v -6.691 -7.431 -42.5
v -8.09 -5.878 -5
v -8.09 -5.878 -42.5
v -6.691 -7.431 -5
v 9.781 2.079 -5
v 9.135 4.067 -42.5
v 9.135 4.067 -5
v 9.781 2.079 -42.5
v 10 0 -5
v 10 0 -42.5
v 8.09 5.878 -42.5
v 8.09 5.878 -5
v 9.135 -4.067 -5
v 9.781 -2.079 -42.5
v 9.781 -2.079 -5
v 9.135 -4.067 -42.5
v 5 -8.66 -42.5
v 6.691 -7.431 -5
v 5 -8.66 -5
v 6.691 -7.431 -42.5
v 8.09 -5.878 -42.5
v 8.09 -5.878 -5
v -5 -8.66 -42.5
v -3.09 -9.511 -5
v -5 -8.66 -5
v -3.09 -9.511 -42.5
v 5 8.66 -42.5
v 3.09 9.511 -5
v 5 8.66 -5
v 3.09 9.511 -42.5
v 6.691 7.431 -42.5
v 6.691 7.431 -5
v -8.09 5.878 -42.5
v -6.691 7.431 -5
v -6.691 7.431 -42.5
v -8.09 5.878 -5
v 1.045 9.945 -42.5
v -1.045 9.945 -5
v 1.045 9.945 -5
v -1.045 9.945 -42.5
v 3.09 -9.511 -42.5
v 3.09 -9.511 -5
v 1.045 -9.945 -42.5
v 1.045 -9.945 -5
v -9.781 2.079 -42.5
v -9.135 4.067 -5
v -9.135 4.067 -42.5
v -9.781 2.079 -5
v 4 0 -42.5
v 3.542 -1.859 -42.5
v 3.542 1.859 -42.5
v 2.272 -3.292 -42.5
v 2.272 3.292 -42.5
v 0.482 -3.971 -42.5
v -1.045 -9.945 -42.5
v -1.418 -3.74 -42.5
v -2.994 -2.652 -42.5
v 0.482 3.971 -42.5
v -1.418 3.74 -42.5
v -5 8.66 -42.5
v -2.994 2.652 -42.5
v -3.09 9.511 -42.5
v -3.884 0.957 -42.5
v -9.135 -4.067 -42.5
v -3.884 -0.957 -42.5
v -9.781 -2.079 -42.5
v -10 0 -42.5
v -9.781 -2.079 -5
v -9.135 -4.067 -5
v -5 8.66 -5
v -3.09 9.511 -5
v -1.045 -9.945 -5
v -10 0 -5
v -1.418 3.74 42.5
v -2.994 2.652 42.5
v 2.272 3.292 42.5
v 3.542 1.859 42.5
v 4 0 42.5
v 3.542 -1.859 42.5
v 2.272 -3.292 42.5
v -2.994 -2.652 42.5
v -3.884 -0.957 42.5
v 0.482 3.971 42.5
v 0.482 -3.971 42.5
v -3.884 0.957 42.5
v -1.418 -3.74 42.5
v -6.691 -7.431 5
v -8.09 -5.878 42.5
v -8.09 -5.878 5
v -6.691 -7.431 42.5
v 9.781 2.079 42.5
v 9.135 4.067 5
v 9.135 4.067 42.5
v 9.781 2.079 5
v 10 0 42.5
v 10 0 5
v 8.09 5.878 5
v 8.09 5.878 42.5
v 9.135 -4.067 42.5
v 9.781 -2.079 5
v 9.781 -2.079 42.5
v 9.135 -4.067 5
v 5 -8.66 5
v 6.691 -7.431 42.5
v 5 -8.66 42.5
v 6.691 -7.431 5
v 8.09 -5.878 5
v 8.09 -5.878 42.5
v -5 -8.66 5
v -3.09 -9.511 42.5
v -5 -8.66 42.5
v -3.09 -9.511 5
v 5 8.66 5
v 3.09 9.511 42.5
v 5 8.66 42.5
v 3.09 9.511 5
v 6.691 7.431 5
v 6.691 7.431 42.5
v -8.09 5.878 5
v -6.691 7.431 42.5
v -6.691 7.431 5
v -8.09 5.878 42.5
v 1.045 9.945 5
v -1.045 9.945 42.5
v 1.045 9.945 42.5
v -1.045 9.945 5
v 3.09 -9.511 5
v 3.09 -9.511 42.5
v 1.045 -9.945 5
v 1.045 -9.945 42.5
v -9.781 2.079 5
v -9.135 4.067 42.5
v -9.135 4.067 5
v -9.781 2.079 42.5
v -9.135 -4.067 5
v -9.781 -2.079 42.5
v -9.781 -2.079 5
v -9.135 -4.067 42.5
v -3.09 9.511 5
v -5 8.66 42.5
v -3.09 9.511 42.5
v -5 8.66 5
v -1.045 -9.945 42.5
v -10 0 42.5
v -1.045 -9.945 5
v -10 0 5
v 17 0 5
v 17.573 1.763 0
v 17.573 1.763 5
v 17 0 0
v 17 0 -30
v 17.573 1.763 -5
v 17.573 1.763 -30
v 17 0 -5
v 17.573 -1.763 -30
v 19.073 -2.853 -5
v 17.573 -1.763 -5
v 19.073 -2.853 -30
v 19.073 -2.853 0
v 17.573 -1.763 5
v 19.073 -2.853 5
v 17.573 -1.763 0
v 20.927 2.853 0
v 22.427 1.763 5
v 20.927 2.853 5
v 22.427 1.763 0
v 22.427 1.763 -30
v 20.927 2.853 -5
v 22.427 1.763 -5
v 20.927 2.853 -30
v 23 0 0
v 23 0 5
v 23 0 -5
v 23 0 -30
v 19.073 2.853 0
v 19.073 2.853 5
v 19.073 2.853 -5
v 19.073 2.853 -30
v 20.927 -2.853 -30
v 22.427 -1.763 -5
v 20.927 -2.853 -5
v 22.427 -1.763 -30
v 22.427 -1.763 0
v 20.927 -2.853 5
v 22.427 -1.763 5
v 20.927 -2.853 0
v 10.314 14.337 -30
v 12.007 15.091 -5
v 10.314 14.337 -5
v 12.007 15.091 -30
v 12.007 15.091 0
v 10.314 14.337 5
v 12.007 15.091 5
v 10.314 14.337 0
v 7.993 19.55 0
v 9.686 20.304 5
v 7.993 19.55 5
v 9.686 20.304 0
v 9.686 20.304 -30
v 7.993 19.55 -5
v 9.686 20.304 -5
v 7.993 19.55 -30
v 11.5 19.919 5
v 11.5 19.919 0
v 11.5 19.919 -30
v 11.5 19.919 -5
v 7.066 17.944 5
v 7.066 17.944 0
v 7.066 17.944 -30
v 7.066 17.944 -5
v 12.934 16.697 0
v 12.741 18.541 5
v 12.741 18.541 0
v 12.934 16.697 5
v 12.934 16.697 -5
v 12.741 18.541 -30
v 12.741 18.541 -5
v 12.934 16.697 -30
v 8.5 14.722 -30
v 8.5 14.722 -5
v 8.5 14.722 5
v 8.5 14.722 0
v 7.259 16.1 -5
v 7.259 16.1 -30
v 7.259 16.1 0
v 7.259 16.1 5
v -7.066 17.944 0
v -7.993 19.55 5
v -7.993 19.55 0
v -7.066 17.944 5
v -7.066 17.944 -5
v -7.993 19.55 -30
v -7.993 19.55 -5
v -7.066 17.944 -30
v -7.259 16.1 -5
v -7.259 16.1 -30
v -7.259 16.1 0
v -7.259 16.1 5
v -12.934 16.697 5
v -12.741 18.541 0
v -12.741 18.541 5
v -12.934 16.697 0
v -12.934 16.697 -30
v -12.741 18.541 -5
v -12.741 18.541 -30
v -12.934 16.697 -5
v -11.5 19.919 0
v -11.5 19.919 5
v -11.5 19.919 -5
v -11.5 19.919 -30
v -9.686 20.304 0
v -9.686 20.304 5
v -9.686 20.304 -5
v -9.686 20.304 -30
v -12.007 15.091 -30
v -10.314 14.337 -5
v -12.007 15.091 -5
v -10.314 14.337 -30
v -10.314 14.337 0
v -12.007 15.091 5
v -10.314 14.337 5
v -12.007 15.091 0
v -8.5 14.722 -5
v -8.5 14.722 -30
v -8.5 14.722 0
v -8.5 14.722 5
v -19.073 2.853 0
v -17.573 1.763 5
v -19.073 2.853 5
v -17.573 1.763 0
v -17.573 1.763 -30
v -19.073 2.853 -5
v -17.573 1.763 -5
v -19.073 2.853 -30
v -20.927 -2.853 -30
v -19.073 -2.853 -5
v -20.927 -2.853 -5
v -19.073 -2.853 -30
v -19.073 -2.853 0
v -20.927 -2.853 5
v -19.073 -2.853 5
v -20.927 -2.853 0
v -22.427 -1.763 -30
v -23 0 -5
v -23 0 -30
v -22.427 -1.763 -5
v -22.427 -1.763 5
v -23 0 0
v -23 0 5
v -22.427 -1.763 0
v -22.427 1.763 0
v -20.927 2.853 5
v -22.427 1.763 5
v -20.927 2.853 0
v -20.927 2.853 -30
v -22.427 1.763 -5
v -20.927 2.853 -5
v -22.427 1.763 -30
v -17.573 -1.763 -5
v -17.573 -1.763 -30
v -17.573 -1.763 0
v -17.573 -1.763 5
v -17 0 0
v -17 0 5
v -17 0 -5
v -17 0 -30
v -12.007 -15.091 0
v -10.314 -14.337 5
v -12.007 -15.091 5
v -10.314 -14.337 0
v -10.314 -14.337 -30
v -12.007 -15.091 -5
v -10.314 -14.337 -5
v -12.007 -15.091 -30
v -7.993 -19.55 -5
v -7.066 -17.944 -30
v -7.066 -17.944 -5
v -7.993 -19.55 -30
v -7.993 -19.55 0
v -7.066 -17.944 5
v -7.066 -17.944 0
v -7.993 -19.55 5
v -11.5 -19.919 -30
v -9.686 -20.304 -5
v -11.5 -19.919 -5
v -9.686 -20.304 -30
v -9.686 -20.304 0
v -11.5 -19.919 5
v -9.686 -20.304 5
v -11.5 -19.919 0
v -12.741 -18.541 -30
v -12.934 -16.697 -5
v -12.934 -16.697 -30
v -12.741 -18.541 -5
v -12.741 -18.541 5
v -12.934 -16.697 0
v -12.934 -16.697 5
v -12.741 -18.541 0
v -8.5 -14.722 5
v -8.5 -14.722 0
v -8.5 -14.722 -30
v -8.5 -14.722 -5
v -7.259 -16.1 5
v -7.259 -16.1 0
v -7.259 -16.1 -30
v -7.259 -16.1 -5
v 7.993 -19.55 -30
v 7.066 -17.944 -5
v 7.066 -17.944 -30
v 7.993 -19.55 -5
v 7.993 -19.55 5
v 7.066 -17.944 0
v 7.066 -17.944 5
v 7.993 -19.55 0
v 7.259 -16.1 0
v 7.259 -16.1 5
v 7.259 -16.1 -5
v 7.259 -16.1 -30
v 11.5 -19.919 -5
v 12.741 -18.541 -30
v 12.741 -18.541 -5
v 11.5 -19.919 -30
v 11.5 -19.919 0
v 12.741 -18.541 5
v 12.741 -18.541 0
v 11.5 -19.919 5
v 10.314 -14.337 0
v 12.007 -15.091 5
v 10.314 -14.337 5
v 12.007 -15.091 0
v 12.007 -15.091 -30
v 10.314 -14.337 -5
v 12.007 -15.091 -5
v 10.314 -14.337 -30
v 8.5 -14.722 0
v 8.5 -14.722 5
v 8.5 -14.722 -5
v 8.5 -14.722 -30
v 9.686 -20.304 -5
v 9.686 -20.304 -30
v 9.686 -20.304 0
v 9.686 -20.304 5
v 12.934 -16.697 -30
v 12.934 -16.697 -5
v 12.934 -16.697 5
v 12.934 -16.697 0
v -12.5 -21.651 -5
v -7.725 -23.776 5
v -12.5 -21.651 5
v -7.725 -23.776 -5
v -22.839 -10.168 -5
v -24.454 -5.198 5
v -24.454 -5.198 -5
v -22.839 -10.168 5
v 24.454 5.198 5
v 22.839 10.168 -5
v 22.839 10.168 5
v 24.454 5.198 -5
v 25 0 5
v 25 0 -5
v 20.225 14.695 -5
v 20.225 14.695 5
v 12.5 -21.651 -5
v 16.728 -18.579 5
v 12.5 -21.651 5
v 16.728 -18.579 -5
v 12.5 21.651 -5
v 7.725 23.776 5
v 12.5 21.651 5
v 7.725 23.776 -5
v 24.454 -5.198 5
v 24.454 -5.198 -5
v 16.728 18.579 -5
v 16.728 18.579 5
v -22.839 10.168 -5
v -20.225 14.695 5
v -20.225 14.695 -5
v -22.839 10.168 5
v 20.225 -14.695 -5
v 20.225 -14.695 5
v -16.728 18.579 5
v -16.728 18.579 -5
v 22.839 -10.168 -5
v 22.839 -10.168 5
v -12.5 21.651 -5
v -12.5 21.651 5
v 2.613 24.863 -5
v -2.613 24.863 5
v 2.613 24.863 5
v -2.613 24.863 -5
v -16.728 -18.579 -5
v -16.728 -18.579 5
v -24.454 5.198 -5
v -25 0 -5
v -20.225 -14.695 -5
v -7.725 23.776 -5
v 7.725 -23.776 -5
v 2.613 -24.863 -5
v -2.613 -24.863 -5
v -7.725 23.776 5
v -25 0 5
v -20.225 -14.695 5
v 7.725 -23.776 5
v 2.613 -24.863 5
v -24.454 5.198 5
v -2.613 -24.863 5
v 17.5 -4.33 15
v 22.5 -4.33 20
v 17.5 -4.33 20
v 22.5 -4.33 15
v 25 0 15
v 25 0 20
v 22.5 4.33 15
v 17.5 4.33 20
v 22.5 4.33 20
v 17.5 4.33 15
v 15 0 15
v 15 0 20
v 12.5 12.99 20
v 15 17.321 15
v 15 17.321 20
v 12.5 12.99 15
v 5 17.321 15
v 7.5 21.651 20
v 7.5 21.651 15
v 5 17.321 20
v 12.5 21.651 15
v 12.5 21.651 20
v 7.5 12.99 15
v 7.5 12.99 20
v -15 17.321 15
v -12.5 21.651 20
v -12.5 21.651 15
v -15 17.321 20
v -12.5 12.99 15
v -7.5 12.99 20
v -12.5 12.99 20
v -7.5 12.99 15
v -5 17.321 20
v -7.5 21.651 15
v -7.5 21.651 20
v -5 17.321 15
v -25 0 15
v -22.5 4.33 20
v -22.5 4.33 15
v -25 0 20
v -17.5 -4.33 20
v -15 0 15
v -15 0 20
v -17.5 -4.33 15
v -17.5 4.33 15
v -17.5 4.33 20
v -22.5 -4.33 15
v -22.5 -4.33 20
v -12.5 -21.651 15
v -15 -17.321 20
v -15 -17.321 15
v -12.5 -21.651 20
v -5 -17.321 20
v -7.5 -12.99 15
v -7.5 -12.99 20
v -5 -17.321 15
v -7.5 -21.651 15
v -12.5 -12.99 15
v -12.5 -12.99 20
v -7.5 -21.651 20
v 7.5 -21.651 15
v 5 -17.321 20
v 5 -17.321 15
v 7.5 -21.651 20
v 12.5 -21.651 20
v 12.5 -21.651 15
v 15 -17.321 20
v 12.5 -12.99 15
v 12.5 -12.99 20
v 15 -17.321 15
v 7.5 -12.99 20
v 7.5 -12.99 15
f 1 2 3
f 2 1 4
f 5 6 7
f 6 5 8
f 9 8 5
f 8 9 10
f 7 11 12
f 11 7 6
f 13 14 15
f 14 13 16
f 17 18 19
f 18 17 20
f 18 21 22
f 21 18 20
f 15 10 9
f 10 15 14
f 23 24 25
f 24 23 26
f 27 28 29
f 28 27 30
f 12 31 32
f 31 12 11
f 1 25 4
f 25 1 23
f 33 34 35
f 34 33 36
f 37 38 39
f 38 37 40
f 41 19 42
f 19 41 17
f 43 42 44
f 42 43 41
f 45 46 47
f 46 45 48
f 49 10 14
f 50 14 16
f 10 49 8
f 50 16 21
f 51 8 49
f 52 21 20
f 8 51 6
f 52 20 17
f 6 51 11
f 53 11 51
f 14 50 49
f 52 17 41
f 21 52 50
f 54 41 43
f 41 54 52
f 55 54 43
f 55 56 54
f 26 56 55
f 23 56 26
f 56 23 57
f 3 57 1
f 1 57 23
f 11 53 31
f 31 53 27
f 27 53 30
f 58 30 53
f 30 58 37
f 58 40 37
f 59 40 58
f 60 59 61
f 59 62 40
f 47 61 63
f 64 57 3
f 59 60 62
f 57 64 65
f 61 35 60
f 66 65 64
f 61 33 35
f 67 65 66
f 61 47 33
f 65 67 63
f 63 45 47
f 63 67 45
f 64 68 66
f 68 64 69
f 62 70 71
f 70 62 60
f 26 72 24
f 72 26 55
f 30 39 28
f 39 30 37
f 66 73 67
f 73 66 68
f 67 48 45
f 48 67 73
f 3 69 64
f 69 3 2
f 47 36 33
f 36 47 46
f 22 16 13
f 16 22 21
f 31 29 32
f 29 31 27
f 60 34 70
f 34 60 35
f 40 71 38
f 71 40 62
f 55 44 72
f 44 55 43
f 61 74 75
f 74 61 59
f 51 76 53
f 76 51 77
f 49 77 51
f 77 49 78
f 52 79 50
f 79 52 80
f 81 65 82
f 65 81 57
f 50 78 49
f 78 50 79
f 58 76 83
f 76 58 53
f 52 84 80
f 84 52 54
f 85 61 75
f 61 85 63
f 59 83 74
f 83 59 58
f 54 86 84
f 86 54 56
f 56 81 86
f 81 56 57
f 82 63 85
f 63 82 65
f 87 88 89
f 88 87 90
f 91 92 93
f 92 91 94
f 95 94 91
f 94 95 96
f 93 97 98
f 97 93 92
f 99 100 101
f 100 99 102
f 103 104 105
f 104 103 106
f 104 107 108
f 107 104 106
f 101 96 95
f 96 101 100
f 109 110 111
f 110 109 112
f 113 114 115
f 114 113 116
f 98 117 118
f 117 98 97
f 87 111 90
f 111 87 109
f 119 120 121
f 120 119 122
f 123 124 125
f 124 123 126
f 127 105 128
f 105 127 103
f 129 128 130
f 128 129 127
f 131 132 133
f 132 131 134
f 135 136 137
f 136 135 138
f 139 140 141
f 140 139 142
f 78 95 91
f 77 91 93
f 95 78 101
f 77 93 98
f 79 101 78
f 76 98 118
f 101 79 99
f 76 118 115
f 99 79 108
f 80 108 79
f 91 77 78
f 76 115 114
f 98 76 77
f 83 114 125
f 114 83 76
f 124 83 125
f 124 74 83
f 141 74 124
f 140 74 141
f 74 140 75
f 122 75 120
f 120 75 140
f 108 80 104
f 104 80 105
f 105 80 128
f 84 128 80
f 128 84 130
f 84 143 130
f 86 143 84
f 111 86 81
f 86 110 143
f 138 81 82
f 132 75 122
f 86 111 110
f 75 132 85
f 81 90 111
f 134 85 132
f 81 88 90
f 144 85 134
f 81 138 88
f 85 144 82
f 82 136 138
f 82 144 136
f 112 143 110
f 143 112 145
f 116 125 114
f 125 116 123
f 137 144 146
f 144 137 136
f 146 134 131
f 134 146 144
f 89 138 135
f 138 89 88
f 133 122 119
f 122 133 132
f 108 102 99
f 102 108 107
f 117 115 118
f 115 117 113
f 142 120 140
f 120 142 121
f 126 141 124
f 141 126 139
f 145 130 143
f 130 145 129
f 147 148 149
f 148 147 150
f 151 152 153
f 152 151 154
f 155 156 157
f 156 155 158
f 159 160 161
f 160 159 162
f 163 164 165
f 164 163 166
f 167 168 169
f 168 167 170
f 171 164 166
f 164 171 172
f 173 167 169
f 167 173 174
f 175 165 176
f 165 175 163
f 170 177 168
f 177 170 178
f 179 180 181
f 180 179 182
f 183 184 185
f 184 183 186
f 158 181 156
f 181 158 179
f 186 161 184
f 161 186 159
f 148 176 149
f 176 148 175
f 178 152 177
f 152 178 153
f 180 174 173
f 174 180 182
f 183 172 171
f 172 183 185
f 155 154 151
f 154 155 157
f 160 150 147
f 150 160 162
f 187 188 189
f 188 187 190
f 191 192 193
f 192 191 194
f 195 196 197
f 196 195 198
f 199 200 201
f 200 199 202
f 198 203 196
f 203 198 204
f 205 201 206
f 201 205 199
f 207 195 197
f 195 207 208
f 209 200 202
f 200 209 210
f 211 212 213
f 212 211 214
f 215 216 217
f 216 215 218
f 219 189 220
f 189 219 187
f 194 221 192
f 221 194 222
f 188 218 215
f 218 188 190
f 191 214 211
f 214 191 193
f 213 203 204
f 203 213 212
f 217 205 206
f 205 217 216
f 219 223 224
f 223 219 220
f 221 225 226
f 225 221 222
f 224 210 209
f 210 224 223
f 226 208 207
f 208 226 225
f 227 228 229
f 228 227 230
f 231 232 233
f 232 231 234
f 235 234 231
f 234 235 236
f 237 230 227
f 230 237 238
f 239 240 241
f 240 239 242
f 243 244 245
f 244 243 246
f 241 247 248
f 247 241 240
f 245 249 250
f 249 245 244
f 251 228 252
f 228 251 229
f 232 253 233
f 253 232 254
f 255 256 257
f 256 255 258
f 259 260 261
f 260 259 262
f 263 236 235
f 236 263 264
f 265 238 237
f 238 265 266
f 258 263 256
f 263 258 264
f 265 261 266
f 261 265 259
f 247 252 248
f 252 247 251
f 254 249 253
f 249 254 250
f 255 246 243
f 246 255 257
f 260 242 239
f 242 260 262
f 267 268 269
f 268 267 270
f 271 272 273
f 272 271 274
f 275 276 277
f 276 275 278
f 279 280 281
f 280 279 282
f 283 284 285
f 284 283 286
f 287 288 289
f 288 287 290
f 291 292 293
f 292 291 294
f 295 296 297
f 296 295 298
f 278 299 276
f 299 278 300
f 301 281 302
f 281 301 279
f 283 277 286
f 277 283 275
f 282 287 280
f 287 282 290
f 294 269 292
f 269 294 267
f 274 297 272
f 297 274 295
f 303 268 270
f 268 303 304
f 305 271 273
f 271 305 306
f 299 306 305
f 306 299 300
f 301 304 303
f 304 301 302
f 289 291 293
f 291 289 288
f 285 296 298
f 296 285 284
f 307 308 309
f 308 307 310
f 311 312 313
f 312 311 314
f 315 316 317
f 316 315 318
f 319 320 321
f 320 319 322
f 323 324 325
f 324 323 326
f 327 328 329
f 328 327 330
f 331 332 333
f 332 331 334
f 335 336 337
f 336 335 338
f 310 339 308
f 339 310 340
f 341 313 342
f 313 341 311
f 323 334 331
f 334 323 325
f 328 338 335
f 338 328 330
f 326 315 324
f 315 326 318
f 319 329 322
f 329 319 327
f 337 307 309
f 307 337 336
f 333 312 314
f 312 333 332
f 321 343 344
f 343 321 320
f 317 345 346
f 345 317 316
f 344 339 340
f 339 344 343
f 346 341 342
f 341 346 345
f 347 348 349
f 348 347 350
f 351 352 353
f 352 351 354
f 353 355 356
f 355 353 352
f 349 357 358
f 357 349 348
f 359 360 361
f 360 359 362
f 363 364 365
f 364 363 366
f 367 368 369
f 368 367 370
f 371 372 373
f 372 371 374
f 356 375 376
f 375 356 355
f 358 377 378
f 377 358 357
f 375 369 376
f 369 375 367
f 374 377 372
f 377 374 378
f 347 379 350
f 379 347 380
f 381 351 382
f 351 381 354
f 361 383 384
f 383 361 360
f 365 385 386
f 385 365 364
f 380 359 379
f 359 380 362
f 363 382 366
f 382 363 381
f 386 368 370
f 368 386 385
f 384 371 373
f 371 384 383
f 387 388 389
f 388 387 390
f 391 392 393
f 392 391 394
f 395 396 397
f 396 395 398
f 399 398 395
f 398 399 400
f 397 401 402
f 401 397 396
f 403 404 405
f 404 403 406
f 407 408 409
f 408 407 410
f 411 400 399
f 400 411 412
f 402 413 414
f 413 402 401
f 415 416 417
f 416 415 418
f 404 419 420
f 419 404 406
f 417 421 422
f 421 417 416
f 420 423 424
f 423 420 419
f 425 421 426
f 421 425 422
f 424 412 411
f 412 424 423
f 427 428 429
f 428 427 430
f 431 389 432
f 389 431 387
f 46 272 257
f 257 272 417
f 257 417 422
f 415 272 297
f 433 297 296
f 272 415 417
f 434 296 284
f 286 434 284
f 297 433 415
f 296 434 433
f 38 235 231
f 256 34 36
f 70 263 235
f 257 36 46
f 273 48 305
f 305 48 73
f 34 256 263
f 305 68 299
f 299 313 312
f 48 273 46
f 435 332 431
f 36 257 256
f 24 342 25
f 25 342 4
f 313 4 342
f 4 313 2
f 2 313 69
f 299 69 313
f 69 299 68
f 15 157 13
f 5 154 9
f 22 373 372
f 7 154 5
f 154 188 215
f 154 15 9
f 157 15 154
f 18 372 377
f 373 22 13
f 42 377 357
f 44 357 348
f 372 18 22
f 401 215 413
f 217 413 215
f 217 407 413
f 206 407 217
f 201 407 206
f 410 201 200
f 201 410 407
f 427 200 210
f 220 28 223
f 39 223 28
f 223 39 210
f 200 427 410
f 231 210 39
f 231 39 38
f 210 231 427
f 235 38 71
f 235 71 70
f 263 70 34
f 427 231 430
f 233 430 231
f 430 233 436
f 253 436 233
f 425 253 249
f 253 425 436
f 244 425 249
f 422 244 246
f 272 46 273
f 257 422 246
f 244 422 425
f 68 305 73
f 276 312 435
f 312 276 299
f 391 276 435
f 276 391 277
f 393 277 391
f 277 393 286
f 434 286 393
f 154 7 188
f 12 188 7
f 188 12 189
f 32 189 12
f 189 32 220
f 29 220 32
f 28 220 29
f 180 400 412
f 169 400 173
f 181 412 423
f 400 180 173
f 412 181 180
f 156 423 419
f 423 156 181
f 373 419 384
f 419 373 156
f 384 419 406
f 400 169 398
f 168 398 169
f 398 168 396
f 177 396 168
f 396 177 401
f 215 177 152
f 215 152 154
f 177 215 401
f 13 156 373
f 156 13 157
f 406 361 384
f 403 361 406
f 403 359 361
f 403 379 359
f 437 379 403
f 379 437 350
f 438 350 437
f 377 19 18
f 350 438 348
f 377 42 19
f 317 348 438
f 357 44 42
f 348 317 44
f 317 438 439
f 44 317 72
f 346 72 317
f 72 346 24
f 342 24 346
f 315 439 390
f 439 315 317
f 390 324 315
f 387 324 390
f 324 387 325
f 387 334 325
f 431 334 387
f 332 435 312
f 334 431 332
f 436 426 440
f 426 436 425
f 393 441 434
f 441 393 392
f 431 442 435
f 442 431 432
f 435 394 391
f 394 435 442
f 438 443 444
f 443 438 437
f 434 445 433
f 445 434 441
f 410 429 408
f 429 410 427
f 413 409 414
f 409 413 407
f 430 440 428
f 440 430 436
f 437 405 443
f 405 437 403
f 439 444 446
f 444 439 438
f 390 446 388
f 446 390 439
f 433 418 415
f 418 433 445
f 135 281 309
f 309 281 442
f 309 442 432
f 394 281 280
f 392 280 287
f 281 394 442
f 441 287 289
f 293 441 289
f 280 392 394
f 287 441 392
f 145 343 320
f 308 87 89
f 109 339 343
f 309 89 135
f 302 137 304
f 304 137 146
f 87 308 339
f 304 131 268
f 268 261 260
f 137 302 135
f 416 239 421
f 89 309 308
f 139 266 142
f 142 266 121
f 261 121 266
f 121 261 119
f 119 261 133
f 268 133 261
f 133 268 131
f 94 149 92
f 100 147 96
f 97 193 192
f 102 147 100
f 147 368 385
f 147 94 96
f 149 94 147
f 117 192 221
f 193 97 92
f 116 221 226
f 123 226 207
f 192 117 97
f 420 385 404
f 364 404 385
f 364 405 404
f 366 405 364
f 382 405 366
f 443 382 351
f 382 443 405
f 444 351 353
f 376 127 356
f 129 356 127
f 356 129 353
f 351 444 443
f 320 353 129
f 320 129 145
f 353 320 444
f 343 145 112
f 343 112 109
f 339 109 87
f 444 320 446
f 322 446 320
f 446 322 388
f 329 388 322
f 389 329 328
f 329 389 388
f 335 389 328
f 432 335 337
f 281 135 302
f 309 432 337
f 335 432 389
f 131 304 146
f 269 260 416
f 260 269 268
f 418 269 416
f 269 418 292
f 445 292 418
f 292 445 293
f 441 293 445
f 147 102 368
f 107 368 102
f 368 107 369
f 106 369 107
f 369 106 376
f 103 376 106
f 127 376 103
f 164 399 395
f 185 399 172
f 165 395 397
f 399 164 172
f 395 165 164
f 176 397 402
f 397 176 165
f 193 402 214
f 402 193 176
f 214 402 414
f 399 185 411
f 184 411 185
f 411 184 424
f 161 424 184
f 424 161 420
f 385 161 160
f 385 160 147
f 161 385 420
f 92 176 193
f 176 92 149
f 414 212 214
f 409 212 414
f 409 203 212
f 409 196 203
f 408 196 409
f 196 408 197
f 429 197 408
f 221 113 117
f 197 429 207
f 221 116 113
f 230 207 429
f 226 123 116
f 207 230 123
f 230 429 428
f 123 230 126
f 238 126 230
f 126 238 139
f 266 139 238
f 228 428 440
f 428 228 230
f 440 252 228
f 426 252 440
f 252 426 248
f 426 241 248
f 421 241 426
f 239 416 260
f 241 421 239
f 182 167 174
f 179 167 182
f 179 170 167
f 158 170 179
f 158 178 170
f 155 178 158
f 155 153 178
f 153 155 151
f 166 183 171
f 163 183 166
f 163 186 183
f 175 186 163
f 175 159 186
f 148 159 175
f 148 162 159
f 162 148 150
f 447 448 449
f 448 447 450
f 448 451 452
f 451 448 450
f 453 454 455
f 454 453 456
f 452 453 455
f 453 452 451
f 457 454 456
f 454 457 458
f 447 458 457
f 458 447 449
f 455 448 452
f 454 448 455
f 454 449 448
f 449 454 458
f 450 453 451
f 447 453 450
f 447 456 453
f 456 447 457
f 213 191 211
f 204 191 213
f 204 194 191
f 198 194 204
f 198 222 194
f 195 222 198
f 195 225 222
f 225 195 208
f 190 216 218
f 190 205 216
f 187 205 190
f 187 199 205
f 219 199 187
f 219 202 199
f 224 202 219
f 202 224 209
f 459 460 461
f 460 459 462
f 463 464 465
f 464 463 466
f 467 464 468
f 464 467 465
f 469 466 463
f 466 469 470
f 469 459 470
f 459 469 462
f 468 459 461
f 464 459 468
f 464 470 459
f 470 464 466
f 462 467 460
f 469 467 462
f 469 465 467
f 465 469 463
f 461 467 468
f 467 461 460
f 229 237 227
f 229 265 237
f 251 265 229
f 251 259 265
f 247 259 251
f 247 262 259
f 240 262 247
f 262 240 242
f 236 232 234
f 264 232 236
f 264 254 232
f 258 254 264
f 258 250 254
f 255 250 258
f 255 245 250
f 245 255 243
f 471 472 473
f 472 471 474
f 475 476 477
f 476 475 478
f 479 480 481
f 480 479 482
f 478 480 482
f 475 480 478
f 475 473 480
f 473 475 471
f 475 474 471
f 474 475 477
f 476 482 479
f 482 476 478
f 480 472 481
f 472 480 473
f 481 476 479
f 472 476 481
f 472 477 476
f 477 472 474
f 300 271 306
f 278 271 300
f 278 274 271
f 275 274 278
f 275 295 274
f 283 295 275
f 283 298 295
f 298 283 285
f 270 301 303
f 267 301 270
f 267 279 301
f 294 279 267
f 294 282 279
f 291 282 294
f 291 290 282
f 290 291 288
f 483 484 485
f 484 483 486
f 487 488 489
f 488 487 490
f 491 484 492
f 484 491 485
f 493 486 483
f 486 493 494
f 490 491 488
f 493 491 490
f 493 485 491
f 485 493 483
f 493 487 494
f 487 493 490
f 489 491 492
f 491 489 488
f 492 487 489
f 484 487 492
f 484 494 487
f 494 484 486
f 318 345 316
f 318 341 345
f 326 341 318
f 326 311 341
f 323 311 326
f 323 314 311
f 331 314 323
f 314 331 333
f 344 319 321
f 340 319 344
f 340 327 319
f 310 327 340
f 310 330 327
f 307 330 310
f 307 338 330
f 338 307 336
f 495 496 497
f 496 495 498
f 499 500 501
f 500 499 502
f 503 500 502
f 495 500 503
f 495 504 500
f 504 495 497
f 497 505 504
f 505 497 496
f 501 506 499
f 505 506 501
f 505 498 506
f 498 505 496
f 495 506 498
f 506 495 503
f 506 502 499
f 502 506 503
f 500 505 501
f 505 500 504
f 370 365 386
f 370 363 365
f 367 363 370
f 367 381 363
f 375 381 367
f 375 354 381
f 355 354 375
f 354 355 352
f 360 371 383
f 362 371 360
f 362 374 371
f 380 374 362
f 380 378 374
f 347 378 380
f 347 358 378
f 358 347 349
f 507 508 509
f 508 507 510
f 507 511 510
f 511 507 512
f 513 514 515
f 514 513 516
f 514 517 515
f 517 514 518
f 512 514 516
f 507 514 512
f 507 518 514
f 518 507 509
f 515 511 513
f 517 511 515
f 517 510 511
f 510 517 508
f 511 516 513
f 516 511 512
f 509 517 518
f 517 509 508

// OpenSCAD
// Parameters
shaft_length = 40;
shaft_diameter = 20;
shaft_hole_diameter = 8;

flange_diameter = 50;
flange_thickness = 5;
flange_hole_diameter = 8;
bolt_hole_radius = 3;
bolt_spacing_radius = 20;

diaphragm_thickness = 2;

bolt_length = 30;
bolt_diameter = 6;
nut_size = 10;

// Shaft Module
module shaft() {
    difference() {
        cylinder(h = shaft_length, d = shaft_diameter, center = true);
        cylinder(h = shaft_length + 2, d = shaft_hole_diameter, center = true);
    }
}

// Flange Module
module flange() {
    difference() {
        cylinder(h = flange_thickness, d = flange_diameter, center = true);
        cylinder(h = flange_thickness + 2, d = flange_hole_diameter, center = true);
        for (i = [0:60:360]) {
            rotate([0, 0, i])
            translate([bolt_spacing_radius, 0, 0])
            cylinder(h = flange_thickness + 2, d = bolt_hole_radius * 2, center = true);
        }
    }
}

// Diaphragm Module
module diaphragm() {
    difference() {
        cylinder(h = diaphragm_thickness, d = flange_diameter - 5, center = true);
        cylinder(h = diaphragm_thickness + 2, d = flange_hole_diameter, center = true);
        for (i = [0:60:360]) {
            rotate([0, 0, i])
            translate([bolt_spacing_radius, 0, 0])
            cylinder(h = diaphragm_thickness + 2, d = bolt_hole_radius * 2, center = true);
        }
    }
}

// Bolt Module
module bolt() {
    cylinder(h = bolt_length, d = bolt_diameter, center = true);
}

// Nut Module
module nut() {
    cylinder(h = nut_size / 2, d = nut_size, $fn = 6);
}

// Assembly
module coupling() {
    translate([0, 0, -shaft_length / 2 - flange_thickness / 2])
    shaft();
    
    translate([0, 0, shaft_length / 2 + flange_thickness / 2])
    shaft();
    
    translate([0, 0, -flange_thickness / 2])
    flange();
    
    translate([0, 0, flange_thickness / 2])
    flange();
    
    translate([0, 0, 0])
    diaphragm();
    
    for (i = [0:60:360]) {
        rotate([0, 0, i])
        translate([bolt_spacing_radius, 0, -bolt_length / 2])
        bolt();
        
        rotate([0, 0, i])
        translate([bolt_spacing_radius, 0, bolt_length / 2])
        nut();
    }
}

// Render the coupling
coupling();
